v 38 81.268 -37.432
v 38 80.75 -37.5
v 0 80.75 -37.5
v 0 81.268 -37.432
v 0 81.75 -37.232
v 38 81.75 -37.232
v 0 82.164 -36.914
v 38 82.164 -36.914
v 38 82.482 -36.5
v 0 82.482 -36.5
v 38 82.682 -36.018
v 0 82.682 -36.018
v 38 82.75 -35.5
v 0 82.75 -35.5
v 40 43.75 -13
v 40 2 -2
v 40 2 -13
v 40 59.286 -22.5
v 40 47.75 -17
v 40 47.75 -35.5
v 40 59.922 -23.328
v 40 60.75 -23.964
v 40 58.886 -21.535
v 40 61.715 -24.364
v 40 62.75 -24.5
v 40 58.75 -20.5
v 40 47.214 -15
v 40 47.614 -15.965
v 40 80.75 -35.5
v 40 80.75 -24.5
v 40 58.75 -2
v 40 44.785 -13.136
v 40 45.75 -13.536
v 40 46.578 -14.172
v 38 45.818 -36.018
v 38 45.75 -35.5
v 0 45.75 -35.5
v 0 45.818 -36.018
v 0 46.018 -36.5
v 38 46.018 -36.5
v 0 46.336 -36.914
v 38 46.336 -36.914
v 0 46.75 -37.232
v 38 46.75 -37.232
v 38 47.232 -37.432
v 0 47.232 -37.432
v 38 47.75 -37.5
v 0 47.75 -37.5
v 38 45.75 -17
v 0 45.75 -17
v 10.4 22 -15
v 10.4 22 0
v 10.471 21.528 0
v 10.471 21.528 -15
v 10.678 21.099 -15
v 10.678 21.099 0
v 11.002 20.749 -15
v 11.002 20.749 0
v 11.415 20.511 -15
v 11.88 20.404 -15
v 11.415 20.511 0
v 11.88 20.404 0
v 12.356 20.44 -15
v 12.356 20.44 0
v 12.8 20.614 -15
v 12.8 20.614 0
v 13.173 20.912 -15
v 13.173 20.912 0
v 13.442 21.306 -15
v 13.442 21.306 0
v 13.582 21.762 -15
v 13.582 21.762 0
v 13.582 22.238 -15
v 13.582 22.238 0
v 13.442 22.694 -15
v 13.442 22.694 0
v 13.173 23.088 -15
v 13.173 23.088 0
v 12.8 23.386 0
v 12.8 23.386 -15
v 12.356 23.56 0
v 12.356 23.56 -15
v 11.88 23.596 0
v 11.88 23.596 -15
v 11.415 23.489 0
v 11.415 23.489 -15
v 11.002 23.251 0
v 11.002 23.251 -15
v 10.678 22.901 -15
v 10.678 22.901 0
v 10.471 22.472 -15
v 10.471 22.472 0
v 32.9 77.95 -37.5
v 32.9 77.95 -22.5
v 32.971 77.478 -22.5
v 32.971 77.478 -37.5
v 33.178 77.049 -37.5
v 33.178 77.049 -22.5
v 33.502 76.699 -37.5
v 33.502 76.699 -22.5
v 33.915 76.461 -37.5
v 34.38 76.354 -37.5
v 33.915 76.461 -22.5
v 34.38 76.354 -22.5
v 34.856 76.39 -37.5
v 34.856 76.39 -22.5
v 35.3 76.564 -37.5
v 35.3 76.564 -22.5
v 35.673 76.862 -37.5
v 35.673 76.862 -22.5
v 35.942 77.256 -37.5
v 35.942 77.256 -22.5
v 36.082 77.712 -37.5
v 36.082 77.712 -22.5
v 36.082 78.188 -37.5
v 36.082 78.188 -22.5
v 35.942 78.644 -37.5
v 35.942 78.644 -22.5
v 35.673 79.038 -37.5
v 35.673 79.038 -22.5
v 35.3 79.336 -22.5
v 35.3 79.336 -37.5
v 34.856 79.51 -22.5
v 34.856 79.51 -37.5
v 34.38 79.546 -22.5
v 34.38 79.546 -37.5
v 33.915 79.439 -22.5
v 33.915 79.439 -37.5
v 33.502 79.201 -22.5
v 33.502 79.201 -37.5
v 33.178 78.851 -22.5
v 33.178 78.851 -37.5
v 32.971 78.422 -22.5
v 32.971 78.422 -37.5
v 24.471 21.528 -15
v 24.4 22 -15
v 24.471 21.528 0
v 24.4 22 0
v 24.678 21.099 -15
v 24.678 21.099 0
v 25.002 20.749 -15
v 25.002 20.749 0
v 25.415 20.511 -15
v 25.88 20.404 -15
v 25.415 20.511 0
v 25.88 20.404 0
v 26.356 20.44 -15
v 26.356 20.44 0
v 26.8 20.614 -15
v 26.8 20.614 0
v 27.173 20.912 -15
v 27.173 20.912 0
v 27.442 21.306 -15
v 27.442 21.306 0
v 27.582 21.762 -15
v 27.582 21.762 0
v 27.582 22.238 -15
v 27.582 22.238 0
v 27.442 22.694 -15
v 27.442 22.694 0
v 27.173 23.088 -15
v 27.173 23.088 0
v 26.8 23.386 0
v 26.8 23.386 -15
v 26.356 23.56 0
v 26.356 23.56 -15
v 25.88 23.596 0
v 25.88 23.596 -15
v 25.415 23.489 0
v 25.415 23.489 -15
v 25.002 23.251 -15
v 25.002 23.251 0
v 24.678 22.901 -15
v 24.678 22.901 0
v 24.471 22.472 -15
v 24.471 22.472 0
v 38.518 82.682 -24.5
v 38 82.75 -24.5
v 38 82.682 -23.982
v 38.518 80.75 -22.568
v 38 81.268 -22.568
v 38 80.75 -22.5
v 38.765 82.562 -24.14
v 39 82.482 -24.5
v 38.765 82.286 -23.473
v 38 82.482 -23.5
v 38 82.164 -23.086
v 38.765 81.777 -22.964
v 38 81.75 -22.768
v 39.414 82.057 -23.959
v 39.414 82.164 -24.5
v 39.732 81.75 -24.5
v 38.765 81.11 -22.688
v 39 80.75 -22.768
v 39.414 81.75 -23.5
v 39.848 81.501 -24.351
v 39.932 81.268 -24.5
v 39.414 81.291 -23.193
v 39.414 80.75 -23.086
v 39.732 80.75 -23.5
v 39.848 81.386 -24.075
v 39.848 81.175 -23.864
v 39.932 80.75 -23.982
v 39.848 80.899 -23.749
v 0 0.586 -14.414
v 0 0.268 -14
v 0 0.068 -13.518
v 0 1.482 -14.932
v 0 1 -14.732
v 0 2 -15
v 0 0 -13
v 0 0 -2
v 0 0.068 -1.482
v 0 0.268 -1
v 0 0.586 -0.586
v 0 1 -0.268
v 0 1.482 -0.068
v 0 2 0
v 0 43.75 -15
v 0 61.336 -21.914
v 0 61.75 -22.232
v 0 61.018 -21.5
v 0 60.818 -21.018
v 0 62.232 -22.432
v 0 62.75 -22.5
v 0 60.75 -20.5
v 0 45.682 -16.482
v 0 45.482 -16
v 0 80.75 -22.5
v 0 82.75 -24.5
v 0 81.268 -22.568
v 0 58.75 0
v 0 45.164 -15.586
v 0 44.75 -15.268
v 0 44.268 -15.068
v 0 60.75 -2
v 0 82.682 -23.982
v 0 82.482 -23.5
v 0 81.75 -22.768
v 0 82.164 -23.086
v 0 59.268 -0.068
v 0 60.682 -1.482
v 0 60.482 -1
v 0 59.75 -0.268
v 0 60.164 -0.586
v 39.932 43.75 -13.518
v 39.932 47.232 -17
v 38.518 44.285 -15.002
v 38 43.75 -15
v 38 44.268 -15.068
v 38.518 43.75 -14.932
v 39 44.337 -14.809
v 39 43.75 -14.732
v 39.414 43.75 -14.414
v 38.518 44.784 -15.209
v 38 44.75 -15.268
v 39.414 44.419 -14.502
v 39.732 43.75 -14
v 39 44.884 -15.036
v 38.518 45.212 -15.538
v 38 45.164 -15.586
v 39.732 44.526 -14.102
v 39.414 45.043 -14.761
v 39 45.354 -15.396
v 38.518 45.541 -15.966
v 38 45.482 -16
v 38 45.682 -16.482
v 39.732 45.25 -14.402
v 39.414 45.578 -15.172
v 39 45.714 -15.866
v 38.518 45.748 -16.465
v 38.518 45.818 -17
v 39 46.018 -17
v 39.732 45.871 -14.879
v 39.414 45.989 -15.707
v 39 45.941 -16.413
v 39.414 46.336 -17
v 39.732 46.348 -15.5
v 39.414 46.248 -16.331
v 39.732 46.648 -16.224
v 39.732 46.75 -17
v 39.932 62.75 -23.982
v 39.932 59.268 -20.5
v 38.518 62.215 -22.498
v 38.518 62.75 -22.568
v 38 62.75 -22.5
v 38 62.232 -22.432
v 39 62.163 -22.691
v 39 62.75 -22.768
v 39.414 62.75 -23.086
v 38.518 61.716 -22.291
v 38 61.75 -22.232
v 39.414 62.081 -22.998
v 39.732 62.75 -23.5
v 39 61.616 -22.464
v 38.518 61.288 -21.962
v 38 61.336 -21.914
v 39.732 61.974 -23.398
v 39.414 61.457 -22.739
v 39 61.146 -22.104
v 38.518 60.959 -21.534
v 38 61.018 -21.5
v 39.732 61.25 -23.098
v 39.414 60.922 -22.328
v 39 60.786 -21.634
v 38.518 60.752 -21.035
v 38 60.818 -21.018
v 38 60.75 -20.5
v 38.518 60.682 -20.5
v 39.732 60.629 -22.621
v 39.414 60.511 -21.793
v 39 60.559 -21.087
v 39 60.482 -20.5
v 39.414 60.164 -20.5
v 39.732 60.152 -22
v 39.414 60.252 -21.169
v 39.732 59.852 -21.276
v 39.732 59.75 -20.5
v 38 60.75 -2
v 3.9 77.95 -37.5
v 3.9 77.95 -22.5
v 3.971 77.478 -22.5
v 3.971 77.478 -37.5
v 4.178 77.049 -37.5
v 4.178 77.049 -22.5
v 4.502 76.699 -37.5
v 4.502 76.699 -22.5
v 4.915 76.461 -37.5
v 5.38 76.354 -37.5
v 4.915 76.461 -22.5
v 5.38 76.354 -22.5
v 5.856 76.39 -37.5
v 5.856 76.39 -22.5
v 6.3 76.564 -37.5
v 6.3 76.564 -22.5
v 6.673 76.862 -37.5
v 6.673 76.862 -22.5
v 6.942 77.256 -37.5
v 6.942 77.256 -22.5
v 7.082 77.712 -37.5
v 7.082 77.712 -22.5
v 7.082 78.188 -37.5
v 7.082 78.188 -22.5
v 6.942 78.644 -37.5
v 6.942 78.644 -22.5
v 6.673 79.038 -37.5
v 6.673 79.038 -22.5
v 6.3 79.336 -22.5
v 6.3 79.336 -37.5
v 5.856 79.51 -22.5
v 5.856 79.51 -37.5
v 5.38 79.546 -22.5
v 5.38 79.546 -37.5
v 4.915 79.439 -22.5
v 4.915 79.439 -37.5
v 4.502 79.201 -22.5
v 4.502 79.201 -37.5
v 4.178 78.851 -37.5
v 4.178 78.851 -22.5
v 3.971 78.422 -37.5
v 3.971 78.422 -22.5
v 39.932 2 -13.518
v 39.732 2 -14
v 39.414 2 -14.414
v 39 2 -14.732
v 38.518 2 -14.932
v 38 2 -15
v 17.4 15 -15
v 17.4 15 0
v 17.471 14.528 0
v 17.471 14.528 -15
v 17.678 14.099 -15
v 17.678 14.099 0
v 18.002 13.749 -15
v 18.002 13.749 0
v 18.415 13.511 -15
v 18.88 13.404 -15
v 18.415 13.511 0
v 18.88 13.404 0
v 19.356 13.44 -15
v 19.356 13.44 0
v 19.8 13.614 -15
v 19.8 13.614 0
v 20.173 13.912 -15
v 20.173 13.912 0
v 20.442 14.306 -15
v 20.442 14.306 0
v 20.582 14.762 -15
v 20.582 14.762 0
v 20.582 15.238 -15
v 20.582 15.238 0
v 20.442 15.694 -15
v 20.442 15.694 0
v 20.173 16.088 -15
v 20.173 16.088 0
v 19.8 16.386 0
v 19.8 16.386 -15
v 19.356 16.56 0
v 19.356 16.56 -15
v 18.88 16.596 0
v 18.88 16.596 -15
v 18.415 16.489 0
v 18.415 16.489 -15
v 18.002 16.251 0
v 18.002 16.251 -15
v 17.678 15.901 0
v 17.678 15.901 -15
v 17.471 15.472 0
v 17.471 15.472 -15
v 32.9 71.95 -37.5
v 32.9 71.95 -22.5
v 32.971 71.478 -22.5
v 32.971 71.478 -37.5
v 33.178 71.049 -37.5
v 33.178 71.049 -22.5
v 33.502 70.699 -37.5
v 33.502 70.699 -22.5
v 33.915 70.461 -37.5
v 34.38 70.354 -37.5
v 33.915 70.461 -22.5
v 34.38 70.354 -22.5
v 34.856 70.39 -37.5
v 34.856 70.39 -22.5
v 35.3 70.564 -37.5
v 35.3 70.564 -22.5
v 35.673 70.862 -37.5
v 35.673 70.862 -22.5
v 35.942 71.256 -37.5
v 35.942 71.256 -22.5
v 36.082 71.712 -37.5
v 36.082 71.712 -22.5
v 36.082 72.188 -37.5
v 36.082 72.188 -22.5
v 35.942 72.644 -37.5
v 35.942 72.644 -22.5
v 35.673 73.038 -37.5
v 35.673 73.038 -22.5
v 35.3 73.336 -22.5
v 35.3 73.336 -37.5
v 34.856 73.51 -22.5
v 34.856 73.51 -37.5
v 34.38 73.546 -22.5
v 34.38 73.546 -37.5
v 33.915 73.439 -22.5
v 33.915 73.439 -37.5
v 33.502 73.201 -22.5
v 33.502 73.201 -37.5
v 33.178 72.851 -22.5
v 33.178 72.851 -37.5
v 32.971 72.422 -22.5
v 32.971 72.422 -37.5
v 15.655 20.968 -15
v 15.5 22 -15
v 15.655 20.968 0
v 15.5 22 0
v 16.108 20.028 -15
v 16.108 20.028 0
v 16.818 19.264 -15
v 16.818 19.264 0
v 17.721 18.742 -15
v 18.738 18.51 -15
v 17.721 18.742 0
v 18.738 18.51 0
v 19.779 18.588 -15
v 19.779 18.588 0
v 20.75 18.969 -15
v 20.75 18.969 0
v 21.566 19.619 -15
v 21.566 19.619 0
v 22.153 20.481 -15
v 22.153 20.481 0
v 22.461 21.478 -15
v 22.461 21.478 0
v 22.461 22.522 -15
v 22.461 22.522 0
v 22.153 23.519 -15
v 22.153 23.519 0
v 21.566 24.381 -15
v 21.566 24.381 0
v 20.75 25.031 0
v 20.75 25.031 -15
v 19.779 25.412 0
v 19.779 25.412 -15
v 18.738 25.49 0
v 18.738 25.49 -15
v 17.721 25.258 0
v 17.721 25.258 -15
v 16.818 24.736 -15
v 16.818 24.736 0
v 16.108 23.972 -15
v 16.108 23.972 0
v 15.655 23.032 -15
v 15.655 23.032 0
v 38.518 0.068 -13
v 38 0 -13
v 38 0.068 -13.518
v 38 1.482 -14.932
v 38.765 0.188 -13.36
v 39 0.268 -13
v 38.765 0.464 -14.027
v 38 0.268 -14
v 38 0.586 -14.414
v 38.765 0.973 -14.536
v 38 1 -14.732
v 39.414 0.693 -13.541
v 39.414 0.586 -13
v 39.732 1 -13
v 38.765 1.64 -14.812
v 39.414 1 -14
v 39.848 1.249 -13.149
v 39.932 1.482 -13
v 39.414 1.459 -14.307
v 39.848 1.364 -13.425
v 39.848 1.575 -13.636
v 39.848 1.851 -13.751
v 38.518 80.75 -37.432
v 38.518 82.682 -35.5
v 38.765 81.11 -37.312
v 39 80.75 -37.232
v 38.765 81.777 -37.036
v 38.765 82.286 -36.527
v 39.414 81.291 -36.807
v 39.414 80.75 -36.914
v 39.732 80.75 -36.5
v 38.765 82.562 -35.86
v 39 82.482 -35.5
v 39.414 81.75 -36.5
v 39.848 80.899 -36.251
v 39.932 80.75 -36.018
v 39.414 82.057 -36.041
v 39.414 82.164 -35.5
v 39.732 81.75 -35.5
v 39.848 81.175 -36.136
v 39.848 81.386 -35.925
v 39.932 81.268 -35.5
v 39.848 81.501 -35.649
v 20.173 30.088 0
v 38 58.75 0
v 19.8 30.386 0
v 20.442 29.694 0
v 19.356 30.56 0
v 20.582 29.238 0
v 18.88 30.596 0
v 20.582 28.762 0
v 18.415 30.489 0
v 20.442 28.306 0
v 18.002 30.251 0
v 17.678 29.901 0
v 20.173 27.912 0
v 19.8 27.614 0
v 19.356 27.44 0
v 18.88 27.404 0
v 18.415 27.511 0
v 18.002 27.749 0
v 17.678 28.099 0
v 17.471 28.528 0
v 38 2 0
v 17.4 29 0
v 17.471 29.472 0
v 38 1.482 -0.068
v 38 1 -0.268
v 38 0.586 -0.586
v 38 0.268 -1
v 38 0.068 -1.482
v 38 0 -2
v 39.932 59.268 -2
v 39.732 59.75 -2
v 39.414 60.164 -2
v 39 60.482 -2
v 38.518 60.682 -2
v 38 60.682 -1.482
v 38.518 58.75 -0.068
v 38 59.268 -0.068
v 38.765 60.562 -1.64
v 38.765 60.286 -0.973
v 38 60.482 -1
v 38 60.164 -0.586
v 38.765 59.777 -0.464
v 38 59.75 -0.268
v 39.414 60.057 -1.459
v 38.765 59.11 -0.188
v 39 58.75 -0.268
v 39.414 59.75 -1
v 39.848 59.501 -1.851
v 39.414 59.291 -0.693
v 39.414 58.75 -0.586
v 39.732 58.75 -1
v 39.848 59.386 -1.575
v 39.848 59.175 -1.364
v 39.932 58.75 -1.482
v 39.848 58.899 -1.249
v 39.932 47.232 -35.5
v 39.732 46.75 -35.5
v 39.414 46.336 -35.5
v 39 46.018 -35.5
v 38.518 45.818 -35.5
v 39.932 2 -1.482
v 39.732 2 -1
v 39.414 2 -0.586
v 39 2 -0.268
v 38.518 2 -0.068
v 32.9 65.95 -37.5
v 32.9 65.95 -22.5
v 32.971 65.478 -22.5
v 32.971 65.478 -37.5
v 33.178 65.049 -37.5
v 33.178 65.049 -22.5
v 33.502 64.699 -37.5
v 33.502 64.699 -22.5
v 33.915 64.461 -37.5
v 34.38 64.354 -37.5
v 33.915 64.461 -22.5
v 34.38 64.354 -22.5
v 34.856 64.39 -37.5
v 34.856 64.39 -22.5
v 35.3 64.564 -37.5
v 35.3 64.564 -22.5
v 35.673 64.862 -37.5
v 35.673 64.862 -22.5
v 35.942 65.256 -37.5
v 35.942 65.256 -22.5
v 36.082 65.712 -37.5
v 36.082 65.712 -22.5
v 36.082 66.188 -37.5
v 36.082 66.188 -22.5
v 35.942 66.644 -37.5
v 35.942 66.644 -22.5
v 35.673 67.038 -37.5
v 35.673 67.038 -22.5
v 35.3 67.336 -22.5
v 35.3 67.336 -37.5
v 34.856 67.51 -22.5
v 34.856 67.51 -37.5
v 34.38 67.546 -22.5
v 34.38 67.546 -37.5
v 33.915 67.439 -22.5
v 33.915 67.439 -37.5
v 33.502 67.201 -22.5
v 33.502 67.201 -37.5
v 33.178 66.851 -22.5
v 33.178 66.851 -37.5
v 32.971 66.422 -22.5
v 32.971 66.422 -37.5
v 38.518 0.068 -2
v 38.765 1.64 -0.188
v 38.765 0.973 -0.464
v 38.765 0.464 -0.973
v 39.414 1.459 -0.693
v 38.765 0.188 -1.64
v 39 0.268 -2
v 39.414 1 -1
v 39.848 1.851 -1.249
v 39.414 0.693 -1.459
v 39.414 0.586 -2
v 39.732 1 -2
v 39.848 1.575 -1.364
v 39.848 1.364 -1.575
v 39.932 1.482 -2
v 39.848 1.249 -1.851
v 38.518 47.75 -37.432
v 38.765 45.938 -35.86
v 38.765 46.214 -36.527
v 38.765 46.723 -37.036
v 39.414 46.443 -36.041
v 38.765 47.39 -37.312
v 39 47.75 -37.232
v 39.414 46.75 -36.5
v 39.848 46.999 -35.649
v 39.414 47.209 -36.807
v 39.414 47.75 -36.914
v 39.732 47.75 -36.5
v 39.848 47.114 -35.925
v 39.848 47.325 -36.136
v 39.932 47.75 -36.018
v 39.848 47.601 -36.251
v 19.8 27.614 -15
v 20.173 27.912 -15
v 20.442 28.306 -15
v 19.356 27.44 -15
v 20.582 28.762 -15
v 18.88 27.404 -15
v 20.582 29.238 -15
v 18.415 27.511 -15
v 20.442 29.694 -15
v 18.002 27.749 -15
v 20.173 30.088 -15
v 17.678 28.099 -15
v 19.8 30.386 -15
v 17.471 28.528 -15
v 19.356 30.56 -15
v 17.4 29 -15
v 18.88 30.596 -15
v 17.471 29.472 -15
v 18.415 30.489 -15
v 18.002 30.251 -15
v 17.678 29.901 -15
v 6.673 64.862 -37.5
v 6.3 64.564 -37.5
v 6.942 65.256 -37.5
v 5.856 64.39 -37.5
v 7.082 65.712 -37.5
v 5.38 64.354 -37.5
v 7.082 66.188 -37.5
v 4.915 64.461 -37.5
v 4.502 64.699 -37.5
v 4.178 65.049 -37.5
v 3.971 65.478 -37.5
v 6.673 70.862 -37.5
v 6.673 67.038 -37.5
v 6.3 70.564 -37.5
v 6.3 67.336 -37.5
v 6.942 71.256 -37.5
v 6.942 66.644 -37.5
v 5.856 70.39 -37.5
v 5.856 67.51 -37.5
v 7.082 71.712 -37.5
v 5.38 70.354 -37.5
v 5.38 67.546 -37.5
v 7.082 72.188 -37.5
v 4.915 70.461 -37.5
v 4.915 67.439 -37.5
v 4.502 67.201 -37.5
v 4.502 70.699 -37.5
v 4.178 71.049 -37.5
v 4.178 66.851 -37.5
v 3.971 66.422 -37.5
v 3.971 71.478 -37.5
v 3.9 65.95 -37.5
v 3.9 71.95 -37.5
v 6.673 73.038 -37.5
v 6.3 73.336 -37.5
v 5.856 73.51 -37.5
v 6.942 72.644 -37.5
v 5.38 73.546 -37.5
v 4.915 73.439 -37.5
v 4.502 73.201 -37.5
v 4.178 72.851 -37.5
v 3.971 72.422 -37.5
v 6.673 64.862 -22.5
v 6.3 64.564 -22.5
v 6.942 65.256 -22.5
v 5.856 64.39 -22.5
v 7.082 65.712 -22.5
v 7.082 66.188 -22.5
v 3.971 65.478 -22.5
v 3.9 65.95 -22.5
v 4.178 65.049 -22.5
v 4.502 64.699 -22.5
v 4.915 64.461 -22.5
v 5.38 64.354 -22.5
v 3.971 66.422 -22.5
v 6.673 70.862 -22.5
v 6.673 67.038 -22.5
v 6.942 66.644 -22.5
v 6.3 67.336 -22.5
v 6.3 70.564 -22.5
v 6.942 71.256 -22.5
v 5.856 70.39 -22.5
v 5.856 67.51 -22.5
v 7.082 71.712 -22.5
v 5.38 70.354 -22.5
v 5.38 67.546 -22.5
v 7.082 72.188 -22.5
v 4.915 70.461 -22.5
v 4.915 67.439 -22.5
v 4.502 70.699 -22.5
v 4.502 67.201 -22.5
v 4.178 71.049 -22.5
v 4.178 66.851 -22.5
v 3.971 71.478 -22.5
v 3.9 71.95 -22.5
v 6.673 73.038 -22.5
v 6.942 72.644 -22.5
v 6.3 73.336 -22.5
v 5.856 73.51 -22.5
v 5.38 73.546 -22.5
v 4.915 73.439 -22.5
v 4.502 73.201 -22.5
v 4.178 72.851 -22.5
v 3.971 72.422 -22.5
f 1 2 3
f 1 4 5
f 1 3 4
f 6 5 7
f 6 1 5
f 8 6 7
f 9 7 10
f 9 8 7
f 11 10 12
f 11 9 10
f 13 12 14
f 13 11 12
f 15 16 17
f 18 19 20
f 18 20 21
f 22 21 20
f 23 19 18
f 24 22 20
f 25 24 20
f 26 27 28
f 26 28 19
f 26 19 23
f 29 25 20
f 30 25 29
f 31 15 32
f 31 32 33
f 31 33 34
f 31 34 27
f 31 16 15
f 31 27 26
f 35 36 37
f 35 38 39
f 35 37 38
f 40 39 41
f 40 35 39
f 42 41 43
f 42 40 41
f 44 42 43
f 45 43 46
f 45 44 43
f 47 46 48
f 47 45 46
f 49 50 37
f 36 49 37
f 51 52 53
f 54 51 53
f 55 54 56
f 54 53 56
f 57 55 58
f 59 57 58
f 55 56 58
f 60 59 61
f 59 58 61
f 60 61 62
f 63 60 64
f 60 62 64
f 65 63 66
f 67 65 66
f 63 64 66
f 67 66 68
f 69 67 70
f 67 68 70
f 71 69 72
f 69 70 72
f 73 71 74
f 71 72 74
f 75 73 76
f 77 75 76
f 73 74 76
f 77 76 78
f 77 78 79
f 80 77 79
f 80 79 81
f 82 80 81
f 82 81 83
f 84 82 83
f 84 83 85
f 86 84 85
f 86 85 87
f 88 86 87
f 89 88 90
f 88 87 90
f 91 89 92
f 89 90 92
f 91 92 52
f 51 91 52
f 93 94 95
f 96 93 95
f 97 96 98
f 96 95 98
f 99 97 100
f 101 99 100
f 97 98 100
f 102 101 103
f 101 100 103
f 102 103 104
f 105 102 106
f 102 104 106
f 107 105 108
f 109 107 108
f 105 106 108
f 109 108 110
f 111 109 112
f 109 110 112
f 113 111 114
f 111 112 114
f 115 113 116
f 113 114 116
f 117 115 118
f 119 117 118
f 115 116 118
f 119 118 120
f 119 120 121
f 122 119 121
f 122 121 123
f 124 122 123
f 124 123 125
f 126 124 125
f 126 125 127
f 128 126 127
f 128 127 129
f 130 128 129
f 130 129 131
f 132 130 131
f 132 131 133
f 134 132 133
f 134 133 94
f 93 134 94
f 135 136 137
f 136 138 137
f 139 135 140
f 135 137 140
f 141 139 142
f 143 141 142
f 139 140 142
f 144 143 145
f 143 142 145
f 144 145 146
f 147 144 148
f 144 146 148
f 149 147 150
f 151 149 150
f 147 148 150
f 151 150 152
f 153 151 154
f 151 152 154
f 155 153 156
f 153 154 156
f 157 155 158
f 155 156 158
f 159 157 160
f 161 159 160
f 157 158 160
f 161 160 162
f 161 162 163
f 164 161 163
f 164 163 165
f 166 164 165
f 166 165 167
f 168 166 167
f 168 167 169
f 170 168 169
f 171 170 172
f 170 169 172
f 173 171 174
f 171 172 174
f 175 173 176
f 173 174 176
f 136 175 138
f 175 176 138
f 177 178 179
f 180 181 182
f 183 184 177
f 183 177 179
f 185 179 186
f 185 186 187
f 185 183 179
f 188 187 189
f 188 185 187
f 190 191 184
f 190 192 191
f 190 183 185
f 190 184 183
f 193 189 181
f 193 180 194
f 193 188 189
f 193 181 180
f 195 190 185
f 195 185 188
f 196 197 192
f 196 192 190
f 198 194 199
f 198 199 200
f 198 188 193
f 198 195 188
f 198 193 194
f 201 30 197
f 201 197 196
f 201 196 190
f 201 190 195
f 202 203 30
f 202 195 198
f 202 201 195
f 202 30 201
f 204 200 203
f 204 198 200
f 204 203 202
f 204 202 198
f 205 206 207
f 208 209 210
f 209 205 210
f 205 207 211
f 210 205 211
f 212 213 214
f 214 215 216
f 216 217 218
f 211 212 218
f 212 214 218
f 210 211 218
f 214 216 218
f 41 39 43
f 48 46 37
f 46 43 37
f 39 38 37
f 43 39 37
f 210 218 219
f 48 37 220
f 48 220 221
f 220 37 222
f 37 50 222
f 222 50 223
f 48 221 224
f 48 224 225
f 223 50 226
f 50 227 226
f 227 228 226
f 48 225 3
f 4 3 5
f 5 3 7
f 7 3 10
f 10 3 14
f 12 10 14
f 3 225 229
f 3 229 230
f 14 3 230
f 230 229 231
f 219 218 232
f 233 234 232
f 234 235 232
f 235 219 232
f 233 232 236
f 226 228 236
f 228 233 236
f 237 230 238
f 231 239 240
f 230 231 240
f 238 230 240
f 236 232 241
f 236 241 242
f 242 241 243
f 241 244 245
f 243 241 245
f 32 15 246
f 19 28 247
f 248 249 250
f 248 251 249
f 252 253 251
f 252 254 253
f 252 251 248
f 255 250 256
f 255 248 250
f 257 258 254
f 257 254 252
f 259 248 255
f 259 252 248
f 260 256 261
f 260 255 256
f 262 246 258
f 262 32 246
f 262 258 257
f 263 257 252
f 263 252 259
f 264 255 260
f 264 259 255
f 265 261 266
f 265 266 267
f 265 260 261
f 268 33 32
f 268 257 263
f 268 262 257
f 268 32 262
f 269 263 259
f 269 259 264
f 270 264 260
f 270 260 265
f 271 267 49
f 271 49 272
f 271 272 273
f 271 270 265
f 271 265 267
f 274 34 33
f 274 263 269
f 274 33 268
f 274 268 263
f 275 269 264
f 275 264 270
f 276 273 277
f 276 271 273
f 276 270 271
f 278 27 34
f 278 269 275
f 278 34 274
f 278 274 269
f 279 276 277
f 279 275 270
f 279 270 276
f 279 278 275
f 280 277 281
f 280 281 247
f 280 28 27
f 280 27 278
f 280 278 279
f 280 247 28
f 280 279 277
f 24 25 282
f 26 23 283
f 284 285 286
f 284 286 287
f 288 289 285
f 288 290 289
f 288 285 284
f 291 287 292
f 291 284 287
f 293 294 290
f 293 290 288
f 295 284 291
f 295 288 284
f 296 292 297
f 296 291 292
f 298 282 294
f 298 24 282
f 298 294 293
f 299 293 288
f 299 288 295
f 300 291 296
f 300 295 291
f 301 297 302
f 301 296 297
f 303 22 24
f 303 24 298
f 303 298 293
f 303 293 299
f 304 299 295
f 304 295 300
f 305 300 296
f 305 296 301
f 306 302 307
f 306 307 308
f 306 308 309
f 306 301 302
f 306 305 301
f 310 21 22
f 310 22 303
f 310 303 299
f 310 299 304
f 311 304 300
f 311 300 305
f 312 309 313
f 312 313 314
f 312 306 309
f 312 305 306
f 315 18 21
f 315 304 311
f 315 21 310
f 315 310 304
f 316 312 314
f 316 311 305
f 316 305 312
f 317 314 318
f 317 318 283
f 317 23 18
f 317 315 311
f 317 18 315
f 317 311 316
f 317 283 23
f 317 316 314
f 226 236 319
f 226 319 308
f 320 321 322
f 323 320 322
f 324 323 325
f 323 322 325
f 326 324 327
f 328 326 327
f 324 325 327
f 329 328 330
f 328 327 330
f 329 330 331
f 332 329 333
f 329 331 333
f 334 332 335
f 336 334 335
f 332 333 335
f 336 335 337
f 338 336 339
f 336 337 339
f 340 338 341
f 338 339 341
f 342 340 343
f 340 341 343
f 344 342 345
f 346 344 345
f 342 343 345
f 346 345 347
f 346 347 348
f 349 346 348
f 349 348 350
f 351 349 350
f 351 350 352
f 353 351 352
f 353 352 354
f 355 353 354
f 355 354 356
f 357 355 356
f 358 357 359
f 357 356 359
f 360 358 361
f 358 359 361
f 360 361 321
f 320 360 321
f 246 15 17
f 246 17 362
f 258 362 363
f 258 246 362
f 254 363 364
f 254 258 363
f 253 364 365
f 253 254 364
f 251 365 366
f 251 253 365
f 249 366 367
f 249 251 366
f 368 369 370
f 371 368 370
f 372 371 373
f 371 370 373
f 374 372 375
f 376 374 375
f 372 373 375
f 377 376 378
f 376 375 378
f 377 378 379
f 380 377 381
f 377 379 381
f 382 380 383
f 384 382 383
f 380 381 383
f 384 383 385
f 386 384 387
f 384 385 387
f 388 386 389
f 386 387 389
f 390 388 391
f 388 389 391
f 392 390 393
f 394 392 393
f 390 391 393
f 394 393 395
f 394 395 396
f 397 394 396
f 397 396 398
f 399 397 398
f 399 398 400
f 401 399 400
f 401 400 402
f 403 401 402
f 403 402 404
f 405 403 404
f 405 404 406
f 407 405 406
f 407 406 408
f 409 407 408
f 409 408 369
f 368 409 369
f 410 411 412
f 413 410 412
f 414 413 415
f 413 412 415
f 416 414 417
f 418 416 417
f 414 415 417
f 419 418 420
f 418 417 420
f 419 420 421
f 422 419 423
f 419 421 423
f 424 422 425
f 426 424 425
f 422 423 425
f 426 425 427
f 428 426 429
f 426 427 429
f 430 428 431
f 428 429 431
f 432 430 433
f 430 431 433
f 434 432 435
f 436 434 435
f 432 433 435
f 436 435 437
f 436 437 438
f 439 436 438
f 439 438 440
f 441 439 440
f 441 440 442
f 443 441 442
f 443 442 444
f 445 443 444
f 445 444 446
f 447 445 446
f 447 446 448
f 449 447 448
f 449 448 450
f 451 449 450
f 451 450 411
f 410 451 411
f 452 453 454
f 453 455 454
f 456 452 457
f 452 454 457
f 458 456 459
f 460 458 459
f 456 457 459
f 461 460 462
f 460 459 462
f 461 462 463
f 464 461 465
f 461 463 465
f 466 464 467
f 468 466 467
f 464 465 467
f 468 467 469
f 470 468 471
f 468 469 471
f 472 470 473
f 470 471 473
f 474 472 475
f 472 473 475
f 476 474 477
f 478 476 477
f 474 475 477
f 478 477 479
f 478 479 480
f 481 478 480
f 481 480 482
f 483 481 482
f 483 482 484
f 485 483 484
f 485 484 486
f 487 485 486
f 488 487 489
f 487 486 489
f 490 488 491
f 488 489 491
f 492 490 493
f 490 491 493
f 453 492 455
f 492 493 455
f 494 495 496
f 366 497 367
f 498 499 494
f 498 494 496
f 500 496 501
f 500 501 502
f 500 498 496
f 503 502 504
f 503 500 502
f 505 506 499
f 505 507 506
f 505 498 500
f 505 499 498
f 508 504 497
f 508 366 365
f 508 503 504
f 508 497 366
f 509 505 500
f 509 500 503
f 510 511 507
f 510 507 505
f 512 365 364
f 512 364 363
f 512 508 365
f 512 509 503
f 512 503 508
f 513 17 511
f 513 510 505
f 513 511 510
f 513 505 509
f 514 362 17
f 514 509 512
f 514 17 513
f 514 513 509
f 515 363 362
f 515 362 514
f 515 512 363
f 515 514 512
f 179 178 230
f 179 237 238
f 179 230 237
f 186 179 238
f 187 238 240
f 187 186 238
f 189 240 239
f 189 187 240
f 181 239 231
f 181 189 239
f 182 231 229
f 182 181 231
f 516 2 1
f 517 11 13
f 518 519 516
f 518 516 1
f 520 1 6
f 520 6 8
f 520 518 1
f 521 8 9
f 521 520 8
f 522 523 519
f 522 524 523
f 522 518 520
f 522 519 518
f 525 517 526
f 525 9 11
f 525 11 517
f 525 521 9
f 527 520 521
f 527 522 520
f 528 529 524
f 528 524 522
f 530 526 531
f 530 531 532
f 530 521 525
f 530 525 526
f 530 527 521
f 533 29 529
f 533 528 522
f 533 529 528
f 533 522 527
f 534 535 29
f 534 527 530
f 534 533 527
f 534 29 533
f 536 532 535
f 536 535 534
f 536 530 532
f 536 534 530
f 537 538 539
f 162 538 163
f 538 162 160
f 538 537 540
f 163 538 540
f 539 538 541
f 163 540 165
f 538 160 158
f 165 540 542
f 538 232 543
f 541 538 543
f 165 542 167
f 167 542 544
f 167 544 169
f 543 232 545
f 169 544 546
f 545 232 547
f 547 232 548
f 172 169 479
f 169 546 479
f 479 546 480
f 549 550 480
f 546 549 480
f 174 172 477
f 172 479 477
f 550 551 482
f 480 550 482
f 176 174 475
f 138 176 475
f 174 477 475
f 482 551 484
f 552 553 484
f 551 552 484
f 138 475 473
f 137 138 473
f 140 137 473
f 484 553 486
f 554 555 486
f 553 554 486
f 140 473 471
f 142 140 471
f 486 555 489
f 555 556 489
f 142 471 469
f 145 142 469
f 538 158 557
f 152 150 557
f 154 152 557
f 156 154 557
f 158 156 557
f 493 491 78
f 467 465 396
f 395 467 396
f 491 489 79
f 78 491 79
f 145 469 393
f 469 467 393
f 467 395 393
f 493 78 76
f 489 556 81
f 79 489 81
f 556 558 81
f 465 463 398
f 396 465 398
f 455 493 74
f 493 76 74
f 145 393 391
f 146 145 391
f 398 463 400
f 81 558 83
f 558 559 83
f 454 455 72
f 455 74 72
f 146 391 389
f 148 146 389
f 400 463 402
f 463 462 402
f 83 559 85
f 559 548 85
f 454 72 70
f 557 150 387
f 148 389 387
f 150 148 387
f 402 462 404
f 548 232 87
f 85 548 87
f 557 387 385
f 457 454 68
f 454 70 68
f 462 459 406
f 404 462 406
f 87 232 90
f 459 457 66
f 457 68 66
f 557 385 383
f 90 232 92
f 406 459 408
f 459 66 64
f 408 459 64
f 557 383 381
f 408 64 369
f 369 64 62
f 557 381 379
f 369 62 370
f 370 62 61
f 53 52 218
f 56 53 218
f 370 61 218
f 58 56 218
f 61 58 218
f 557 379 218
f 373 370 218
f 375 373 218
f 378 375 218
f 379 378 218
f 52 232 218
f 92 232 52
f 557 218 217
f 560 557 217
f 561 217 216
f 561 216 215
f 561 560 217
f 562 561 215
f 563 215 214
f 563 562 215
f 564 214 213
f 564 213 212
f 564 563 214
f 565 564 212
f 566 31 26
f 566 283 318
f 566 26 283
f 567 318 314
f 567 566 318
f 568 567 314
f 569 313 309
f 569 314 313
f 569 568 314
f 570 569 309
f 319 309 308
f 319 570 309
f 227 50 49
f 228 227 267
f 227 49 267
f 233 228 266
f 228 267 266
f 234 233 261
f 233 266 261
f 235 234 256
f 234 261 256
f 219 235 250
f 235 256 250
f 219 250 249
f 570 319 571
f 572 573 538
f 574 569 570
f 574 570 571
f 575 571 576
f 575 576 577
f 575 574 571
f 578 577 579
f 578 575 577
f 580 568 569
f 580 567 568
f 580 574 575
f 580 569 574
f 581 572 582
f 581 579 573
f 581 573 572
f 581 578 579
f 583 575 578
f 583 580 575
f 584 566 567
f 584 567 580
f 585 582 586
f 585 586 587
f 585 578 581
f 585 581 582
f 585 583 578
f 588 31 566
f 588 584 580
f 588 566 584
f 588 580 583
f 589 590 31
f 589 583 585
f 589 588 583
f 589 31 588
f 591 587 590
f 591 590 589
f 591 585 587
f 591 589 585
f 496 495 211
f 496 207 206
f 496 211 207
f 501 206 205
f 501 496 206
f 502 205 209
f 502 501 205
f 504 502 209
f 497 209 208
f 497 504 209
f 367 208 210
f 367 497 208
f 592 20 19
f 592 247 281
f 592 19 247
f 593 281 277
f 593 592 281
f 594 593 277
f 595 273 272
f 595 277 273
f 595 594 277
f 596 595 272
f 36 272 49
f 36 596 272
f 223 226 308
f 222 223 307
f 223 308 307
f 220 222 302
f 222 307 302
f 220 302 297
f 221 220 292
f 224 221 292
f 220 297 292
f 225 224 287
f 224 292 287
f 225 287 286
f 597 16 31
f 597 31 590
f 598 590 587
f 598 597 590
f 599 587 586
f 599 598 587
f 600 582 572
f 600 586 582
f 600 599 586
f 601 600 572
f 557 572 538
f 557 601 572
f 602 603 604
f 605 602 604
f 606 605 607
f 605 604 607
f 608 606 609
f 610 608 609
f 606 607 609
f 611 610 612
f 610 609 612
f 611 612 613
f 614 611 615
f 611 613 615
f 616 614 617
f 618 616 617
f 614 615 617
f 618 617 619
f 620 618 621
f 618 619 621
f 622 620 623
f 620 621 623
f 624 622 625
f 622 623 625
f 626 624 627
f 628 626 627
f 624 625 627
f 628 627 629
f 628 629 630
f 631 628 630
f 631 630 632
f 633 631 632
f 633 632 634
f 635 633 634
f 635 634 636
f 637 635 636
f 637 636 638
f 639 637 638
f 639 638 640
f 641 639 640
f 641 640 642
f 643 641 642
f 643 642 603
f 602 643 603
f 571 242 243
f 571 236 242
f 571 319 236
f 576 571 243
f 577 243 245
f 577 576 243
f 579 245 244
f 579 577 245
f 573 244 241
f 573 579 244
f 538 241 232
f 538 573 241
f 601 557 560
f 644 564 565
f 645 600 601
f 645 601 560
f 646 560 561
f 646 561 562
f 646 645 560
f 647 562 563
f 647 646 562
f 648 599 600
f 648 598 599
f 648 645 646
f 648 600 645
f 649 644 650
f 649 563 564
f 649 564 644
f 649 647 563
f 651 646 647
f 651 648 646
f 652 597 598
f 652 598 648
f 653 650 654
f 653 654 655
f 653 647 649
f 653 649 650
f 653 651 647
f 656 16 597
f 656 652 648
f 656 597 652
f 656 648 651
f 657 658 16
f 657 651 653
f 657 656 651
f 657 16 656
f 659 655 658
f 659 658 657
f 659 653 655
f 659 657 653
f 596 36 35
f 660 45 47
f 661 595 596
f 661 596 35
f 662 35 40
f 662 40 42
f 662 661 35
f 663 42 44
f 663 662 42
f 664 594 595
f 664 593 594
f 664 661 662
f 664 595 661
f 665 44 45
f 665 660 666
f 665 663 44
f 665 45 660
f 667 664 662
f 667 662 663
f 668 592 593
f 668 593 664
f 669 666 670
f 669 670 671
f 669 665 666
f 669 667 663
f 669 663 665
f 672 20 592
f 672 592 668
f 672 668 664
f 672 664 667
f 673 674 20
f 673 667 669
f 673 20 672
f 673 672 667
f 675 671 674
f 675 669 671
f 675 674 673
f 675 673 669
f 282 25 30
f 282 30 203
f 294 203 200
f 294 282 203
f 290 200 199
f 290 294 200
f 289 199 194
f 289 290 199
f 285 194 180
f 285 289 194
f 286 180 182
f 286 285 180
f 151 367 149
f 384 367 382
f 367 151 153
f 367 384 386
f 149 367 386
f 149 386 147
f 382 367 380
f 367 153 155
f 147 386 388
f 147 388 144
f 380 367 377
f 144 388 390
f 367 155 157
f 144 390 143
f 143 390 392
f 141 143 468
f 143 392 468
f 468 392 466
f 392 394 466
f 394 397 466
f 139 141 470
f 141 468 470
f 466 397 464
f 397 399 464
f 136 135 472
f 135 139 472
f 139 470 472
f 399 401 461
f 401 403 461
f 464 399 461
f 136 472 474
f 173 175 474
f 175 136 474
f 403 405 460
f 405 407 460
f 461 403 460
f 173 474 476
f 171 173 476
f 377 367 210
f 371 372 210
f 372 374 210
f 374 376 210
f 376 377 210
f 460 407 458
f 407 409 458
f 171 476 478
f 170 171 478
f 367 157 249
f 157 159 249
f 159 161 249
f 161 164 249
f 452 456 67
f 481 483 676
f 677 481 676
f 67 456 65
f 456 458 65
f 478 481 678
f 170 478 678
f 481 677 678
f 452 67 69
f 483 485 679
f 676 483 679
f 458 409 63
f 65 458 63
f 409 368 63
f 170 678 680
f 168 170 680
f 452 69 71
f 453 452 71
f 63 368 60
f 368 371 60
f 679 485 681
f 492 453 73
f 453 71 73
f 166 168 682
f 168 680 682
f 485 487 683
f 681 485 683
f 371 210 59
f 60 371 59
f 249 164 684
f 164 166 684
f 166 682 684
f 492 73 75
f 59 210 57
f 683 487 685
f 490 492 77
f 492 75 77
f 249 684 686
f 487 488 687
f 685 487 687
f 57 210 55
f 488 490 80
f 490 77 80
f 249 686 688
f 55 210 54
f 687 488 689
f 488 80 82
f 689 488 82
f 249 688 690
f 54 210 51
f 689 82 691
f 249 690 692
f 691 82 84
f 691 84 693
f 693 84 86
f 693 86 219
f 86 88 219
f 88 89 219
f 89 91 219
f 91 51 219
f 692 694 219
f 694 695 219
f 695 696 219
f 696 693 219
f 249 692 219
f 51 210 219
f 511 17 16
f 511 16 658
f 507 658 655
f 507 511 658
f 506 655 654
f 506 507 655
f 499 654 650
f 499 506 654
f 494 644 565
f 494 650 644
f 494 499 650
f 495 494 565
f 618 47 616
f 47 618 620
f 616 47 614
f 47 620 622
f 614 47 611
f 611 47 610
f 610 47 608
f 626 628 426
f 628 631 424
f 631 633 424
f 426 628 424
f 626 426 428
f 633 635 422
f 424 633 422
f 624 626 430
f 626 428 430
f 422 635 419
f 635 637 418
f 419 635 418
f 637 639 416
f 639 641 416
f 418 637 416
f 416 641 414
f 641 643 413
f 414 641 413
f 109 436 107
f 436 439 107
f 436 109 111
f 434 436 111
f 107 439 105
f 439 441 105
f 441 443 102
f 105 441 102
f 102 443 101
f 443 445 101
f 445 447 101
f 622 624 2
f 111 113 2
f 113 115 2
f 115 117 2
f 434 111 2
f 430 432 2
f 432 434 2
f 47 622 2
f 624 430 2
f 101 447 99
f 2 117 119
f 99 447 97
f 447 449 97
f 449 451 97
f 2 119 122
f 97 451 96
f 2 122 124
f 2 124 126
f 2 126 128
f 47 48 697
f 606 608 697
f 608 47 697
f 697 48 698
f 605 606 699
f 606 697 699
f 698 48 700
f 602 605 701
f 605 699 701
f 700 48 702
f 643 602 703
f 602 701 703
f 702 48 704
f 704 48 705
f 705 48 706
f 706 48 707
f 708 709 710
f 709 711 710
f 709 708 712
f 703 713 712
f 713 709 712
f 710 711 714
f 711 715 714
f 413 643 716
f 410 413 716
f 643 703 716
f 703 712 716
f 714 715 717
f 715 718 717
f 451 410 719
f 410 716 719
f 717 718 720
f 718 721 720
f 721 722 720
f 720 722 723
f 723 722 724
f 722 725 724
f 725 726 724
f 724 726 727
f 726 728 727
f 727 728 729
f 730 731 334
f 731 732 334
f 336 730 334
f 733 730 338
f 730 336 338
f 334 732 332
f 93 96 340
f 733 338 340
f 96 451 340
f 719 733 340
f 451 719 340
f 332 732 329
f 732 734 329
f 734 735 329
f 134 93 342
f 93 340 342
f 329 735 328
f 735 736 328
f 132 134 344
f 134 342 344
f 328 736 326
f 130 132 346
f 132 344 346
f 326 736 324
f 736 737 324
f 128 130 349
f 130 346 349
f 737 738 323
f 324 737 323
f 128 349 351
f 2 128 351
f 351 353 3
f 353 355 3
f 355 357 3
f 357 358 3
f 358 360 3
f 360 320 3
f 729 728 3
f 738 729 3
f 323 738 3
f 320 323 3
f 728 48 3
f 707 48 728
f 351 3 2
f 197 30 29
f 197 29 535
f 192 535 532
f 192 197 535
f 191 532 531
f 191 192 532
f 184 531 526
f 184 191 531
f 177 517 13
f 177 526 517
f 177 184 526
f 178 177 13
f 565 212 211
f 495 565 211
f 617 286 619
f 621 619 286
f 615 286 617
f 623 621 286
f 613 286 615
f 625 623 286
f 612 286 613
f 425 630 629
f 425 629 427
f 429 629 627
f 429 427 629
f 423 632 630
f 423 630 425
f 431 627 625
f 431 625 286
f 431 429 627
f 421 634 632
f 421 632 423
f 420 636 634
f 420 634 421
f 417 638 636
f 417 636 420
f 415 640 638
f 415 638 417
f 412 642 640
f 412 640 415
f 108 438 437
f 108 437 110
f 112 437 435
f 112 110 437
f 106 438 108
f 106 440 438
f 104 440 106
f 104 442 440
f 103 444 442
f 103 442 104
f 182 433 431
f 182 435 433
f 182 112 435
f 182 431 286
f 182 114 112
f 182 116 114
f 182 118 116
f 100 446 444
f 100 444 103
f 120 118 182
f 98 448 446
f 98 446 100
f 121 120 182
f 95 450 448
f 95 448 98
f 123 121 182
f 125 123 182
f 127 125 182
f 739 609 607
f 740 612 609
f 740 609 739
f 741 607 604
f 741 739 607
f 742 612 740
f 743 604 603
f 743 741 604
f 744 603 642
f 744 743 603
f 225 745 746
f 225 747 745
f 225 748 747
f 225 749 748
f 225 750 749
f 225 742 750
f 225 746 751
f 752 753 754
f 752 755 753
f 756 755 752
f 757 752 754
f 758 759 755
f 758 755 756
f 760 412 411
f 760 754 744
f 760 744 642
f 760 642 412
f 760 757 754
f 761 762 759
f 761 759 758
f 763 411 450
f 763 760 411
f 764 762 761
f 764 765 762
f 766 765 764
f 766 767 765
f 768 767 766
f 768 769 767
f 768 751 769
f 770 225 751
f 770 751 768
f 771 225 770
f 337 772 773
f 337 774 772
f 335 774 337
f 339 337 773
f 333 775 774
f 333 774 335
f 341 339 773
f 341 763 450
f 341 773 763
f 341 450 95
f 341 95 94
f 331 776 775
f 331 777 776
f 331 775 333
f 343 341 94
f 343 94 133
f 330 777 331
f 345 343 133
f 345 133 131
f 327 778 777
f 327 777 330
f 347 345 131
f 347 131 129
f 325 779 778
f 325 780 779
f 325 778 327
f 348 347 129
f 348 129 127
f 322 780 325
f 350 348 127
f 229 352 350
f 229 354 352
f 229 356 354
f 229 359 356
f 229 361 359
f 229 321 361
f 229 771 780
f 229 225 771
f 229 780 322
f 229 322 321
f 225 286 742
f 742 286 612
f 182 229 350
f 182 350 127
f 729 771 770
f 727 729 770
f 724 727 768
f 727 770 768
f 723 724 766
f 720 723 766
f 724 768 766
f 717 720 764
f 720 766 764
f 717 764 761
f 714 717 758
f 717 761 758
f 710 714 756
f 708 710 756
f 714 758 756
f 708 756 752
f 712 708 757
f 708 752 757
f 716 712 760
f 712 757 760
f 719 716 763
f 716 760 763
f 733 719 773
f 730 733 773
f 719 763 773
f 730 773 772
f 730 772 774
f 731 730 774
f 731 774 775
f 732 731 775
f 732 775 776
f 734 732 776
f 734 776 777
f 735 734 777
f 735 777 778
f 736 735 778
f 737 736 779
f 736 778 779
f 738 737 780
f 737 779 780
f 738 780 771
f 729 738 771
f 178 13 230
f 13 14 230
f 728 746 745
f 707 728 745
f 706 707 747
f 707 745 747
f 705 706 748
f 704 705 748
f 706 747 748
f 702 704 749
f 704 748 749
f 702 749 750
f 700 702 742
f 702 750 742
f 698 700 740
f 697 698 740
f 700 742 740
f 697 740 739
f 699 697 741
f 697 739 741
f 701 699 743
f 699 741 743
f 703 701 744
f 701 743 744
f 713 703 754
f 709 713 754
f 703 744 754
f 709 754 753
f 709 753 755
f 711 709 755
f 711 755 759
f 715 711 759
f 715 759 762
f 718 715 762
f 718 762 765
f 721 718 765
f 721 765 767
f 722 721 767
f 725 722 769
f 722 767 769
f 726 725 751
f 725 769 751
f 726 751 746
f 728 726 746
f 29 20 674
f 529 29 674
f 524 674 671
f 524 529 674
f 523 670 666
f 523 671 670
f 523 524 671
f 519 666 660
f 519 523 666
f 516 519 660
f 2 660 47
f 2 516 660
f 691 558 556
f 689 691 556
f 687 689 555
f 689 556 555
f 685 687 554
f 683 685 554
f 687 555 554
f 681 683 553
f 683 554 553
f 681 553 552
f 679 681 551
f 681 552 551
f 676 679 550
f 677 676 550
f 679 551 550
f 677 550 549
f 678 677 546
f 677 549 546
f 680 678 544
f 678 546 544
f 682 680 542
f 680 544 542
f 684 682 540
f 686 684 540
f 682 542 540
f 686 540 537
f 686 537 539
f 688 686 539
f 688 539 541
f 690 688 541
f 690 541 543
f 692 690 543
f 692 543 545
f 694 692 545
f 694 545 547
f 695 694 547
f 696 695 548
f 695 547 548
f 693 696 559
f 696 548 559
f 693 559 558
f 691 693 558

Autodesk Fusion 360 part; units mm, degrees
sketch "Sketch1" plane through (0, 0, 0) normal (1, 0, 0) x (0, 1, 0)
  line L0 (0, 0) -> (0, -15)
  line L1 (0, -15) -> (30, -15)
  line L2 (30, -15) -> (45.75, -15)
  line L3 (60.75, -15) -> (60.75, -22.5)
  line L4 (60.75, -37.5) -> (82.75, -37.5)
  line L5 (82.75, -37.5) -> (82.75, -22.5)
  line L6 (60.75, 0) -> (0, 0)
  line L7 (45.75, -15) -> (45.75, -37.5)
  line L8 (45.75, -37.5) -> (60.75, -37.5)
  line L9 (60.75, 0) -> (60.75, -15)
  line L10 (60.75, -22.5) -> (82.75, -22.5)
  dimension "d1" = 15
  dimension "d2" = 30
  dimension "d3" = 30.75
  dimension "d4" = 22.5
  dimension "d5" = 22
  dimension "d6" = 15
  dimension "d8" = 15
  dimension "d9" = 15
extrude "Extrude1" add sketch "Sketch1" along normal blind 40
sketch "Sketch2" plane through (0, 0, -22.5) normal (0, 0, 1) x (-1, 0, 0)
  line L0 (0, -82.75) -> (0, -60.75)
  line L1 (0, -60.75) -> (-40, -60.75)
  line L2 (-40, -60.75) -> (-40, -82.75)
  line L3 (-40, -82.75) -> (0, -82.75)
  line L4 (-40, -82.75) -> (-34.9, -82.75) construction
  line L5 (-20, -82.75) -> (-20, -60.75) construction
  line L6 (-20, -77.95) -> (-5.5, -77.95) construction
  circle A0 centre (-5.5, -77.95) radius 1.6
  circle A1 centre (-5.5, -71.95) radius 1.6
  circle A2 centre (-5.5, -65.95) radius 1.6
  circle A3 centre (-34.5, -77.95) radius 1.6
  circle A4 centre (-34.5, -71.95) radius 1.6
  circle A5 centre (-34.5, -65.95) radius 1.6
  dimension "d40" = 3.2
  dimension "d41" = 3.2
  dimension "d42" = 3.2
fillet "Fillet1" radius 2 8 edges at (20, 0, 0) (20, 0, -15) (20, 60.75, 0) (20, 60.75, -22.5) (20, 82.75, -22.5) (20, 82.75, -37.5) (20, 45.75, -37.5) (20, 45.75, -15)
fillet "Fillet2" radius 2 16 edges at (40, 0.5858, -0.5858) (40, 0, -7.5) (40, 0.5858, -14.4142) (40, 22.875, -15) (40, 45.1642, -15.5858) (40, 45.75, -26.25) (40, 46.3358, -36.9142) (40, 64.25, -37.5) (40, 82.1642, -36.9142) (40, 82.75, -30) (40, 82.1642, -23.0858) (40, 71.75, -22.5) (40, 61.3358, -21.9142) (40, 60.75, -11.25) (40, 60.1642, -0.5858) (40, 30.375, 0)
sketch "Sketch3" plane through (0, 0, 0) normal (0, 0, 1) x (-1, 0, 0)
  line L0 (-38, -2) -> (-38, -58.75)
  line L1 (-38, -58.75) -> (0, -58.75)
  line L2 (0, -58.75) -> (0, -2)
  line L3 (0, -2) -> (-38, -2)
  circle A0 centre (-19, -11.5) radius 0.8
  line L4 (-19, -22) -> (-19, -14.5) construction
  circle A1 centre (-30.6913, -28.75) radius 0.8
  circle A2 centre (-12.5048, -25.75) radius 0.8
  circle A3 centre (-35.5, -22) radius 0.8
  circle A4 centre (-19, -5.5) radius 0.8
  circle A5 centre (-33.2894, -13.75) radius 0.8
  circle A6 centre (-19, -32.5) radius 0.8
  circle A7 centre (-28.0933, -27.25) radius 0.8
  circle A8 centre (-12.5048, -18.25) radius 0.8
  circle A9 centre (-32.5, -22) radius 0.8
  line L5 (-19, 19.2574) -> (-19, -41.0839) construction
  circle A10 centre (-25.4952, -18.25) radius 0.8
  circle A11 centre (-2.5, -22) radius 0.8
  line L6 (-19, -22) -> (-19, -5.5) construction
  circle A12 centre (-9.9067, -16.75) radius 0.8
  circle A13 centre (-30.6913, -15.25) radius 0.8
  circle A14 centre (-8.5, -22) radius 0.8
  circle A15 centre (-7.3087, -28.75) radius 0.8
  circle A16 centre (-28.0933, -16.75) radius 0.8
  circle A17 centre (-19, -38.5) radius 0.8
  line L7 (-19, -22) -> (-19, -8.5) construction
  circle A18 centre (-19, -29.5) radius 0.8
  line L8 (-19, -22) -> (-19, -11.5) construction
  circle A19 centre (-5.5, -22) radius 0.8
  circle A20 centre (-19, -35.5) radius 0.8
  circle A21 centre (-11.5, -22) radius 0.8
  circle A22 centre (-29.5, -22) radius 0.8
  circle A23 centre (-19, -22) radius 19
  circle A24 centre (-4.7106, -30.25) radius 0.8
  circle A25 centre (-33.2894, -30.25) radius 0.8
  circle A26 centre (-19, -14.5) radius 0.8
  circle A27 centre (-25.4952, -25.75) radius 0.8
  circle A28 centre (-9.9067, -27.25) radius 0.8
  circle A29 centre (-26.5, -22) radius 0.8
  circle A30 centre (-7.3087, -15.25) radius 0.8
  circle A31 centre (-4.7106, -13.75) radius 0.8
  circle A32 centre (-19, -8.5) radius 0.8
  line L9 (0, -2) -> (-19, -2) construction
  line L10 (-19, -2) -> (-19, -22) construction
  point P0 (-19, -22)
  dimension "d25" = 360
  dimension "d27" = 90
  dimension "d28" = 38
  dimension "d29" = 7.5
  dimension "d30" = 1.6
  dimension "d31" = 10.5
  dimension "d32" = 1.6
  dimension "d33" = 13.5
  dimension "d34" = 1.6
  dimension "d35" = 16.5
  dimension "d36" = 1.6
  dimension "d37" = 20
extrude "Extrude4" cut sketch "Sketch2" against normal through all contours A0 | A1 | A2 | A3 | A4 | A5
sketch "Sketch4" plane through (0, 0, 0) normal (0, 0, 1) x (-1, 0, 0)
  line L0 (-38, -2) -> (-38, -58.75)
  line L1 (-38, -58.75) -> (0, -58.75)
  line L2 (0, -58.75) -> (0, -2)
  line L3 (0, -2) -> (-38, -2)
  line L4 (-19, -2) -> (-19, -22) construction
  circle A0 centre (-19, -22) radius 19
  line L5 (-19, -22) -> (-19, -29) construction
  circle A1 centre (-19, -29) radius 1.6
  circle A2 centre (-12, -22) radius 1.6
  circle A3 centre (-19, -15) radius 1.6
  circle A4 centre (-26, -22) radius 1.6
  circle A5 centre (-19, -22) radius 3.5
  dimension "d44" = 20
  dimension "d45" = 38
  dimension "d46" = 7
  dimension "d47" = 3.2
  dimension "d49" = 360
  dimension "d50" = 7
extrude "Extrude5" cut sketch "Sketch4" against normal through all contours A1 | A2 | A3 | A4 | A5
equation "d29 = ( 15 / 2 ) * 1 mm"
equation "d31 = ( 21 / 2 ) * 1 mm"
equation "d33 = ( 27 / 2 ) * 1 mm"
equation "d35 = ( 33 / 2 ) * 1 mm"
equation "d46 = ( 14 / 2 ) * 1 mm"
